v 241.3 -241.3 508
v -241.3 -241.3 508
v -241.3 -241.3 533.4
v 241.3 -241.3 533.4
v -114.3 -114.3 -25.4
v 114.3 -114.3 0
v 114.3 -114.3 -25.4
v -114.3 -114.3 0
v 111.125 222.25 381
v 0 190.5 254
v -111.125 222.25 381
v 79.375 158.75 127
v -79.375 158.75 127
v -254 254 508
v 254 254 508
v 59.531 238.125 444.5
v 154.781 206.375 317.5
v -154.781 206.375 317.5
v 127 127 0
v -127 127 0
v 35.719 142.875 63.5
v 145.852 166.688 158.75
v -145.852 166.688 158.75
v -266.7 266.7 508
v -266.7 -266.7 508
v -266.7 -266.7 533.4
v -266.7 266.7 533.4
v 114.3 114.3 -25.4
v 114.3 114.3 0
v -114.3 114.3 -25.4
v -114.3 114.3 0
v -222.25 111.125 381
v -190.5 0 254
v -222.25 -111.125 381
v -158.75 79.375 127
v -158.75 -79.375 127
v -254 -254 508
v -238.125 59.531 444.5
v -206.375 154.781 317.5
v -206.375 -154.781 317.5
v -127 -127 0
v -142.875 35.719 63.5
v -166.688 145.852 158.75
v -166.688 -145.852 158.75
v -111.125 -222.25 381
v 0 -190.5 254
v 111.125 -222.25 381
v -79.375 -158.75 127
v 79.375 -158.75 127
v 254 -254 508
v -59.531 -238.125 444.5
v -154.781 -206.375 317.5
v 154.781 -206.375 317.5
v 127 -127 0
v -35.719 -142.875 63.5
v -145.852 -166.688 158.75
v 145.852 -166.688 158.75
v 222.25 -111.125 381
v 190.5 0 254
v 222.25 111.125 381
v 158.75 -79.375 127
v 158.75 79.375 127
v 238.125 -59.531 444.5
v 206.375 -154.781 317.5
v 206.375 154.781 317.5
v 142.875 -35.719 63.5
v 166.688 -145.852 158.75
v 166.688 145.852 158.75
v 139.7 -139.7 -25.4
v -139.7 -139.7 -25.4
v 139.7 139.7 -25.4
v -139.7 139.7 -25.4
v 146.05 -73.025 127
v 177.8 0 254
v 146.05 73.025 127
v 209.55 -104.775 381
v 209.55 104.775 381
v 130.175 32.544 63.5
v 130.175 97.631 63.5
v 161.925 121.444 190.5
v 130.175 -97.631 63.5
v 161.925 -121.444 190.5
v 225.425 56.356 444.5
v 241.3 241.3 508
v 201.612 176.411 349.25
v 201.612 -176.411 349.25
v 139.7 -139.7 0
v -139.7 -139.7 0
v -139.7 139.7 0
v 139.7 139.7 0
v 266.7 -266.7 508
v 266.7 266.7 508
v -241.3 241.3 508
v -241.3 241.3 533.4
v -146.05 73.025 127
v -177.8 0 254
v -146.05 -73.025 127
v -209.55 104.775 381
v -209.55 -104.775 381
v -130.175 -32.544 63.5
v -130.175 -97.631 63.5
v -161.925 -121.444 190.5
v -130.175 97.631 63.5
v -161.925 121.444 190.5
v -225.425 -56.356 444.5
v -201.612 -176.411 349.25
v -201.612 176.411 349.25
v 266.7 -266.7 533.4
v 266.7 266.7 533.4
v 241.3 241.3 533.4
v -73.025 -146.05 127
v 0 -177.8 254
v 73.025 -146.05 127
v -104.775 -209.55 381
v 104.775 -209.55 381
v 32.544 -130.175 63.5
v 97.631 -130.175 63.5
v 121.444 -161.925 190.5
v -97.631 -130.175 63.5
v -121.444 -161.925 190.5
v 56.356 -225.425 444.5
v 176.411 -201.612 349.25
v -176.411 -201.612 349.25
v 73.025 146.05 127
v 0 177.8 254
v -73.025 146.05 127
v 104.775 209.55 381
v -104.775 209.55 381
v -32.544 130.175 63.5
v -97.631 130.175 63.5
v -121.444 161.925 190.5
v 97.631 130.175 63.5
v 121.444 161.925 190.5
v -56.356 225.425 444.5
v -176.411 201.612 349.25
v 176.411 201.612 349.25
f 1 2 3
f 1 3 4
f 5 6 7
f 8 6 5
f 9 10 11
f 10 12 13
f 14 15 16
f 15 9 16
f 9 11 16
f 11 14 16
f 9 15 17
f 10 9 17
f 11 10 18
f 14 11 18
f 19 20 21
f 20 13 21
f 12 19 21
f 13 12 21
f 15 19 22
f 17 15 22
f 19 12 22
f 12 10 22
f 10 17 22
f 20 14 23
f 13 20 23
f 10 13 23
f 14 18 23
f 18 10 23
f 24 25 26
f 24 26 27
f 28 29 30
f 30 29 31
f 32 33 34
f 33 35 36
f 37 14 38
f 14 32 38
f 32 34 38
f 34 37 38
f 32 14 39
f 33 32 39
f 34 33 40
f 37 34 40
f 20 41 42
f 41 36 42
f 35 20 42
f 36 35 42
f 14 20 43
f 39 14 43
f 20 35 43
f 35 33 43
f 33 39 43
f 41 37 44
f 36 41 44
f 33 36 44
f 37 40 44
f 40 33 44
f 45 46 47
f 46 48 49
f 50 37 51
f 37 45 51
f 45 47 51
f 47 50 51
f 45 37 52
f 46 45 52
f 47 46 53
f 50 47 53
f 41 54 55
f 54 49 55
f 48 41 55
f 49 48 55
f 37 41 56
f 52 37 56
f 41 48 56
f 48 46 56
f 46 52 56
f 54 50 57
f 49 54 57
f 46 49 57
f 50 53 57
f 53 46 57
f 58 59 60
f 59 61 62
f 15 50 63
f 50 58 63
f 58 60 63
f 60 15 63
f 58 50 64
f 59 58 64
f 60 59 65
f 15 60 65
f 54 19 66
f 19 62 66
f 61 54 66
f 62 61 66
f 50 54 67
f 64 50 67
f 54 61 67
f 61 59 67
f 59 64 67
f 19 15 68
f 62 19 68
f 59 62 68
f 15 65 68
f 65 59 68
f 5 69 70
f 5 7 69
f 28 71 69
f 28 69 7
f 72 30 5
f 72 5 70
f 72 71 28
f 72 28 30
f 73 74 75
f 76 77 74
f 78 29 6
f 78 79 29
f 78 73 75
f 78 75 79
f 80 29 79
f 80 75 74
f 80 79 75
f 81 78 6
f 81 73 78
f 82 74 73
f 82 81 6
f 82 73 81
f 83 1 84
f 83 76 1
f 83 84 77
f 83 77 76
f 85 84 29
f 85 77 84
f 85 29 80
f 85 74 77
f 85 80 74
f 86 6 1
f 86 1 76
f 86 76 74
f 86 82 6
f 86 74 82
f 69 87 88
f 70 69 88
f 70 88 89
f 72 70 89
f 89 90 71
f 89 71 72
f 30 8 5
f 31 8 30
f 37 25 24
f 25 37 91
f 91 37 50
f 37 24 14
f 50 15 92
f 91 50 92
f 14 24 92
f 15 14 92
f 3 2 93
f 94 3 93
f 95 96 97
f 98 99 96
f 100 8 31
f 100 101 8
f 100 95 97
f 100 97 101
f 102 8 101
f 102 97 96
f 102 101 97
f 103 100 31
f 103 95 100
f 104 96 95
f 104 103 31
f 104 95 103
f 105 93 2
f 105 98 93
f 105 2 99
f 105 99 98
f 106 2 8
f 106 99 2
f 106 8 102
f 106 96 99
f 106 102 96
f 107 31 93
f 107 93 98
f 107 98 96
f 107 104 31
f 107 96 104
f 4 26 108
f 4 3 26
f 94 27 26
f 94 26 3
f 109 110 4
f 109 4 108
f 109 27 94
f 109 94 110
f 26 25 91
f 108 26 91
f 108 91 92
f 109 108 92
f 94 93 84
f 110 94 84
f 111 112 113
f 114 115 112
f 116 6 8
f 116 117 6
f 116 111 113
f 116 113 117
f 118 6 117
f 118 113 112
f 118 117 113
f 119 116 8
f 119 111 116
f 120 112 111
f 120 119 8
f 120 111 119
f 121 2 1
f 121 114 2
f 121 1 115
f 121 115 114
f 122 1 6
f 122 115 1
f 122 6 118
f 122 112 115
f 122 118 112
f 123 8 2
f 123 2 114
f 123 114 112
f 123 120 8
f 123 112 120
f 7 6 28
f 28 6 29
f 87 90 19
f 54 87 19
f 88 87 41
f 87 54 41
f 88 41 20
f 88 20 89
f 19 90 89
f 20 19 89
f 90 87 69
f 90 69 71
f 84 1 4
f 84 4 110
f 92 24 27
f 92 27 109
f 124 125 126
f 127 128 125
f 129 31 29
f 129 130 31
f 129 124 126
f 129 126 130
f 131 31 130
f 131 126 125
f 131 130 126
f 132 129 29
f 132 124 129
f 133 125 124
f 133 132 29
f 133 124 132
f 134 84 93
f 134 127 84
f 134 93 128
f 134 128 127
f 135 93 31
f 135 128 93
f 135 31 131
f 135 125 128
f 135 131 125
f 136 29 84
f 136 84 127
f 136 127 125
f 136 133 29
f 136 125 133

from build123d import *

# Parameters (mm, degrees)
SKETCH5_W           = 533.4
SKETCH5_H           = 533.4
SKETCH5_W_2         = 482.6
SKETCH5_H_2         = 482.6
BOSS_EXTRUDE1_DEPTH = 25.4
SKETCH6_W           = 279.4
SKETCH6_H           = 279.4
SKETCH6_W_2         = 228.6
SKETCH6_H_2         = 228.6
BOSS_EXTRUDE2_DEPTH = 25.4


with BuildPart() as part:
    # Sketch2 → Loft1 section 0
    with BuildSketch(Plane.XY.offset(508)):
        with BuildLine():
            Line((-254, -254), (254, -254))
            Line((254, -254), (254, 254))
            Line((254, 254), (-254, 254))
            Line((-254, 254), (-254, -254))
        make_face()
    # Sketch1 → Loft1 section 1
    with BuildSketch(Plane.XY):
        with BuildLine():
            Line((-127, -127), (127, -127))
            Line((127, -127), (127, 127))
            Line((127, 127), (-127, 127))
            Line((-127, 127), (-127, -127))
        make_face()
    loft()

    # Sketch4 → Cut-Loft1 section 0
    with BuildSketch(Plane(origin=(0, 0, 0), x_dir=(-1, 0, 0), z_dir=(0, 0, -1))):
        with BuildLine():
            Line((114.3, -114.3), (114.3, 114.3))
            Line((114.3, 114.3), (-114.3, 114.3))
            Line((-114.3, 114.3), (-114.3, -114.3))
            Line((-114.3, -114.3), (114.3, -114.3))
        make_face()
    # Sketch3 → Cut-Loft1 section 1
    with BuildSketch(Plane.XY.offset(508)):
        with BuildLine():
            Line((241.3, -241.3), (241.3, 241.3))
            Line((241.3, 241.3), (-241.3, 241.3))
            Line((-241.3, 241.3), (-241.3, -241.3))
            Line((-241.3, -241.3), (241.3, -241.3))
        make_face()
    loft(mode=Mode.SUBTRACT)

    # Sketch5 → Boss-Extrude1 (add)
    with BuildSketch(Plane.XY.offset(508)):
        Rectangle(SKETCH5_W, SKETCH5_H)
        Rectangle(SKETCH5_W_2, SKETCH5_H_2, mode=Mode.SUBTRACT)
    extrude(amount=BOSS_EXTRUDE1_DEPTH)

    # Sketch6 → Boss-Extrude2 (add)
    with BuildSketch(Plane(origin=(0, 0, 0), x_dir=(-1, 0, 0), z_dir=(0, 0, -1))):
        Rectangle(SKETCH6_W, SKETCH6_H)
        Rectangle(SKETCH6_W_2, SKETCH6_H_2, mode=Mode.SUBTRACT)
    extrude(amount=BOSS_EXTRUDE2_DEPTH)


solid = part.part
